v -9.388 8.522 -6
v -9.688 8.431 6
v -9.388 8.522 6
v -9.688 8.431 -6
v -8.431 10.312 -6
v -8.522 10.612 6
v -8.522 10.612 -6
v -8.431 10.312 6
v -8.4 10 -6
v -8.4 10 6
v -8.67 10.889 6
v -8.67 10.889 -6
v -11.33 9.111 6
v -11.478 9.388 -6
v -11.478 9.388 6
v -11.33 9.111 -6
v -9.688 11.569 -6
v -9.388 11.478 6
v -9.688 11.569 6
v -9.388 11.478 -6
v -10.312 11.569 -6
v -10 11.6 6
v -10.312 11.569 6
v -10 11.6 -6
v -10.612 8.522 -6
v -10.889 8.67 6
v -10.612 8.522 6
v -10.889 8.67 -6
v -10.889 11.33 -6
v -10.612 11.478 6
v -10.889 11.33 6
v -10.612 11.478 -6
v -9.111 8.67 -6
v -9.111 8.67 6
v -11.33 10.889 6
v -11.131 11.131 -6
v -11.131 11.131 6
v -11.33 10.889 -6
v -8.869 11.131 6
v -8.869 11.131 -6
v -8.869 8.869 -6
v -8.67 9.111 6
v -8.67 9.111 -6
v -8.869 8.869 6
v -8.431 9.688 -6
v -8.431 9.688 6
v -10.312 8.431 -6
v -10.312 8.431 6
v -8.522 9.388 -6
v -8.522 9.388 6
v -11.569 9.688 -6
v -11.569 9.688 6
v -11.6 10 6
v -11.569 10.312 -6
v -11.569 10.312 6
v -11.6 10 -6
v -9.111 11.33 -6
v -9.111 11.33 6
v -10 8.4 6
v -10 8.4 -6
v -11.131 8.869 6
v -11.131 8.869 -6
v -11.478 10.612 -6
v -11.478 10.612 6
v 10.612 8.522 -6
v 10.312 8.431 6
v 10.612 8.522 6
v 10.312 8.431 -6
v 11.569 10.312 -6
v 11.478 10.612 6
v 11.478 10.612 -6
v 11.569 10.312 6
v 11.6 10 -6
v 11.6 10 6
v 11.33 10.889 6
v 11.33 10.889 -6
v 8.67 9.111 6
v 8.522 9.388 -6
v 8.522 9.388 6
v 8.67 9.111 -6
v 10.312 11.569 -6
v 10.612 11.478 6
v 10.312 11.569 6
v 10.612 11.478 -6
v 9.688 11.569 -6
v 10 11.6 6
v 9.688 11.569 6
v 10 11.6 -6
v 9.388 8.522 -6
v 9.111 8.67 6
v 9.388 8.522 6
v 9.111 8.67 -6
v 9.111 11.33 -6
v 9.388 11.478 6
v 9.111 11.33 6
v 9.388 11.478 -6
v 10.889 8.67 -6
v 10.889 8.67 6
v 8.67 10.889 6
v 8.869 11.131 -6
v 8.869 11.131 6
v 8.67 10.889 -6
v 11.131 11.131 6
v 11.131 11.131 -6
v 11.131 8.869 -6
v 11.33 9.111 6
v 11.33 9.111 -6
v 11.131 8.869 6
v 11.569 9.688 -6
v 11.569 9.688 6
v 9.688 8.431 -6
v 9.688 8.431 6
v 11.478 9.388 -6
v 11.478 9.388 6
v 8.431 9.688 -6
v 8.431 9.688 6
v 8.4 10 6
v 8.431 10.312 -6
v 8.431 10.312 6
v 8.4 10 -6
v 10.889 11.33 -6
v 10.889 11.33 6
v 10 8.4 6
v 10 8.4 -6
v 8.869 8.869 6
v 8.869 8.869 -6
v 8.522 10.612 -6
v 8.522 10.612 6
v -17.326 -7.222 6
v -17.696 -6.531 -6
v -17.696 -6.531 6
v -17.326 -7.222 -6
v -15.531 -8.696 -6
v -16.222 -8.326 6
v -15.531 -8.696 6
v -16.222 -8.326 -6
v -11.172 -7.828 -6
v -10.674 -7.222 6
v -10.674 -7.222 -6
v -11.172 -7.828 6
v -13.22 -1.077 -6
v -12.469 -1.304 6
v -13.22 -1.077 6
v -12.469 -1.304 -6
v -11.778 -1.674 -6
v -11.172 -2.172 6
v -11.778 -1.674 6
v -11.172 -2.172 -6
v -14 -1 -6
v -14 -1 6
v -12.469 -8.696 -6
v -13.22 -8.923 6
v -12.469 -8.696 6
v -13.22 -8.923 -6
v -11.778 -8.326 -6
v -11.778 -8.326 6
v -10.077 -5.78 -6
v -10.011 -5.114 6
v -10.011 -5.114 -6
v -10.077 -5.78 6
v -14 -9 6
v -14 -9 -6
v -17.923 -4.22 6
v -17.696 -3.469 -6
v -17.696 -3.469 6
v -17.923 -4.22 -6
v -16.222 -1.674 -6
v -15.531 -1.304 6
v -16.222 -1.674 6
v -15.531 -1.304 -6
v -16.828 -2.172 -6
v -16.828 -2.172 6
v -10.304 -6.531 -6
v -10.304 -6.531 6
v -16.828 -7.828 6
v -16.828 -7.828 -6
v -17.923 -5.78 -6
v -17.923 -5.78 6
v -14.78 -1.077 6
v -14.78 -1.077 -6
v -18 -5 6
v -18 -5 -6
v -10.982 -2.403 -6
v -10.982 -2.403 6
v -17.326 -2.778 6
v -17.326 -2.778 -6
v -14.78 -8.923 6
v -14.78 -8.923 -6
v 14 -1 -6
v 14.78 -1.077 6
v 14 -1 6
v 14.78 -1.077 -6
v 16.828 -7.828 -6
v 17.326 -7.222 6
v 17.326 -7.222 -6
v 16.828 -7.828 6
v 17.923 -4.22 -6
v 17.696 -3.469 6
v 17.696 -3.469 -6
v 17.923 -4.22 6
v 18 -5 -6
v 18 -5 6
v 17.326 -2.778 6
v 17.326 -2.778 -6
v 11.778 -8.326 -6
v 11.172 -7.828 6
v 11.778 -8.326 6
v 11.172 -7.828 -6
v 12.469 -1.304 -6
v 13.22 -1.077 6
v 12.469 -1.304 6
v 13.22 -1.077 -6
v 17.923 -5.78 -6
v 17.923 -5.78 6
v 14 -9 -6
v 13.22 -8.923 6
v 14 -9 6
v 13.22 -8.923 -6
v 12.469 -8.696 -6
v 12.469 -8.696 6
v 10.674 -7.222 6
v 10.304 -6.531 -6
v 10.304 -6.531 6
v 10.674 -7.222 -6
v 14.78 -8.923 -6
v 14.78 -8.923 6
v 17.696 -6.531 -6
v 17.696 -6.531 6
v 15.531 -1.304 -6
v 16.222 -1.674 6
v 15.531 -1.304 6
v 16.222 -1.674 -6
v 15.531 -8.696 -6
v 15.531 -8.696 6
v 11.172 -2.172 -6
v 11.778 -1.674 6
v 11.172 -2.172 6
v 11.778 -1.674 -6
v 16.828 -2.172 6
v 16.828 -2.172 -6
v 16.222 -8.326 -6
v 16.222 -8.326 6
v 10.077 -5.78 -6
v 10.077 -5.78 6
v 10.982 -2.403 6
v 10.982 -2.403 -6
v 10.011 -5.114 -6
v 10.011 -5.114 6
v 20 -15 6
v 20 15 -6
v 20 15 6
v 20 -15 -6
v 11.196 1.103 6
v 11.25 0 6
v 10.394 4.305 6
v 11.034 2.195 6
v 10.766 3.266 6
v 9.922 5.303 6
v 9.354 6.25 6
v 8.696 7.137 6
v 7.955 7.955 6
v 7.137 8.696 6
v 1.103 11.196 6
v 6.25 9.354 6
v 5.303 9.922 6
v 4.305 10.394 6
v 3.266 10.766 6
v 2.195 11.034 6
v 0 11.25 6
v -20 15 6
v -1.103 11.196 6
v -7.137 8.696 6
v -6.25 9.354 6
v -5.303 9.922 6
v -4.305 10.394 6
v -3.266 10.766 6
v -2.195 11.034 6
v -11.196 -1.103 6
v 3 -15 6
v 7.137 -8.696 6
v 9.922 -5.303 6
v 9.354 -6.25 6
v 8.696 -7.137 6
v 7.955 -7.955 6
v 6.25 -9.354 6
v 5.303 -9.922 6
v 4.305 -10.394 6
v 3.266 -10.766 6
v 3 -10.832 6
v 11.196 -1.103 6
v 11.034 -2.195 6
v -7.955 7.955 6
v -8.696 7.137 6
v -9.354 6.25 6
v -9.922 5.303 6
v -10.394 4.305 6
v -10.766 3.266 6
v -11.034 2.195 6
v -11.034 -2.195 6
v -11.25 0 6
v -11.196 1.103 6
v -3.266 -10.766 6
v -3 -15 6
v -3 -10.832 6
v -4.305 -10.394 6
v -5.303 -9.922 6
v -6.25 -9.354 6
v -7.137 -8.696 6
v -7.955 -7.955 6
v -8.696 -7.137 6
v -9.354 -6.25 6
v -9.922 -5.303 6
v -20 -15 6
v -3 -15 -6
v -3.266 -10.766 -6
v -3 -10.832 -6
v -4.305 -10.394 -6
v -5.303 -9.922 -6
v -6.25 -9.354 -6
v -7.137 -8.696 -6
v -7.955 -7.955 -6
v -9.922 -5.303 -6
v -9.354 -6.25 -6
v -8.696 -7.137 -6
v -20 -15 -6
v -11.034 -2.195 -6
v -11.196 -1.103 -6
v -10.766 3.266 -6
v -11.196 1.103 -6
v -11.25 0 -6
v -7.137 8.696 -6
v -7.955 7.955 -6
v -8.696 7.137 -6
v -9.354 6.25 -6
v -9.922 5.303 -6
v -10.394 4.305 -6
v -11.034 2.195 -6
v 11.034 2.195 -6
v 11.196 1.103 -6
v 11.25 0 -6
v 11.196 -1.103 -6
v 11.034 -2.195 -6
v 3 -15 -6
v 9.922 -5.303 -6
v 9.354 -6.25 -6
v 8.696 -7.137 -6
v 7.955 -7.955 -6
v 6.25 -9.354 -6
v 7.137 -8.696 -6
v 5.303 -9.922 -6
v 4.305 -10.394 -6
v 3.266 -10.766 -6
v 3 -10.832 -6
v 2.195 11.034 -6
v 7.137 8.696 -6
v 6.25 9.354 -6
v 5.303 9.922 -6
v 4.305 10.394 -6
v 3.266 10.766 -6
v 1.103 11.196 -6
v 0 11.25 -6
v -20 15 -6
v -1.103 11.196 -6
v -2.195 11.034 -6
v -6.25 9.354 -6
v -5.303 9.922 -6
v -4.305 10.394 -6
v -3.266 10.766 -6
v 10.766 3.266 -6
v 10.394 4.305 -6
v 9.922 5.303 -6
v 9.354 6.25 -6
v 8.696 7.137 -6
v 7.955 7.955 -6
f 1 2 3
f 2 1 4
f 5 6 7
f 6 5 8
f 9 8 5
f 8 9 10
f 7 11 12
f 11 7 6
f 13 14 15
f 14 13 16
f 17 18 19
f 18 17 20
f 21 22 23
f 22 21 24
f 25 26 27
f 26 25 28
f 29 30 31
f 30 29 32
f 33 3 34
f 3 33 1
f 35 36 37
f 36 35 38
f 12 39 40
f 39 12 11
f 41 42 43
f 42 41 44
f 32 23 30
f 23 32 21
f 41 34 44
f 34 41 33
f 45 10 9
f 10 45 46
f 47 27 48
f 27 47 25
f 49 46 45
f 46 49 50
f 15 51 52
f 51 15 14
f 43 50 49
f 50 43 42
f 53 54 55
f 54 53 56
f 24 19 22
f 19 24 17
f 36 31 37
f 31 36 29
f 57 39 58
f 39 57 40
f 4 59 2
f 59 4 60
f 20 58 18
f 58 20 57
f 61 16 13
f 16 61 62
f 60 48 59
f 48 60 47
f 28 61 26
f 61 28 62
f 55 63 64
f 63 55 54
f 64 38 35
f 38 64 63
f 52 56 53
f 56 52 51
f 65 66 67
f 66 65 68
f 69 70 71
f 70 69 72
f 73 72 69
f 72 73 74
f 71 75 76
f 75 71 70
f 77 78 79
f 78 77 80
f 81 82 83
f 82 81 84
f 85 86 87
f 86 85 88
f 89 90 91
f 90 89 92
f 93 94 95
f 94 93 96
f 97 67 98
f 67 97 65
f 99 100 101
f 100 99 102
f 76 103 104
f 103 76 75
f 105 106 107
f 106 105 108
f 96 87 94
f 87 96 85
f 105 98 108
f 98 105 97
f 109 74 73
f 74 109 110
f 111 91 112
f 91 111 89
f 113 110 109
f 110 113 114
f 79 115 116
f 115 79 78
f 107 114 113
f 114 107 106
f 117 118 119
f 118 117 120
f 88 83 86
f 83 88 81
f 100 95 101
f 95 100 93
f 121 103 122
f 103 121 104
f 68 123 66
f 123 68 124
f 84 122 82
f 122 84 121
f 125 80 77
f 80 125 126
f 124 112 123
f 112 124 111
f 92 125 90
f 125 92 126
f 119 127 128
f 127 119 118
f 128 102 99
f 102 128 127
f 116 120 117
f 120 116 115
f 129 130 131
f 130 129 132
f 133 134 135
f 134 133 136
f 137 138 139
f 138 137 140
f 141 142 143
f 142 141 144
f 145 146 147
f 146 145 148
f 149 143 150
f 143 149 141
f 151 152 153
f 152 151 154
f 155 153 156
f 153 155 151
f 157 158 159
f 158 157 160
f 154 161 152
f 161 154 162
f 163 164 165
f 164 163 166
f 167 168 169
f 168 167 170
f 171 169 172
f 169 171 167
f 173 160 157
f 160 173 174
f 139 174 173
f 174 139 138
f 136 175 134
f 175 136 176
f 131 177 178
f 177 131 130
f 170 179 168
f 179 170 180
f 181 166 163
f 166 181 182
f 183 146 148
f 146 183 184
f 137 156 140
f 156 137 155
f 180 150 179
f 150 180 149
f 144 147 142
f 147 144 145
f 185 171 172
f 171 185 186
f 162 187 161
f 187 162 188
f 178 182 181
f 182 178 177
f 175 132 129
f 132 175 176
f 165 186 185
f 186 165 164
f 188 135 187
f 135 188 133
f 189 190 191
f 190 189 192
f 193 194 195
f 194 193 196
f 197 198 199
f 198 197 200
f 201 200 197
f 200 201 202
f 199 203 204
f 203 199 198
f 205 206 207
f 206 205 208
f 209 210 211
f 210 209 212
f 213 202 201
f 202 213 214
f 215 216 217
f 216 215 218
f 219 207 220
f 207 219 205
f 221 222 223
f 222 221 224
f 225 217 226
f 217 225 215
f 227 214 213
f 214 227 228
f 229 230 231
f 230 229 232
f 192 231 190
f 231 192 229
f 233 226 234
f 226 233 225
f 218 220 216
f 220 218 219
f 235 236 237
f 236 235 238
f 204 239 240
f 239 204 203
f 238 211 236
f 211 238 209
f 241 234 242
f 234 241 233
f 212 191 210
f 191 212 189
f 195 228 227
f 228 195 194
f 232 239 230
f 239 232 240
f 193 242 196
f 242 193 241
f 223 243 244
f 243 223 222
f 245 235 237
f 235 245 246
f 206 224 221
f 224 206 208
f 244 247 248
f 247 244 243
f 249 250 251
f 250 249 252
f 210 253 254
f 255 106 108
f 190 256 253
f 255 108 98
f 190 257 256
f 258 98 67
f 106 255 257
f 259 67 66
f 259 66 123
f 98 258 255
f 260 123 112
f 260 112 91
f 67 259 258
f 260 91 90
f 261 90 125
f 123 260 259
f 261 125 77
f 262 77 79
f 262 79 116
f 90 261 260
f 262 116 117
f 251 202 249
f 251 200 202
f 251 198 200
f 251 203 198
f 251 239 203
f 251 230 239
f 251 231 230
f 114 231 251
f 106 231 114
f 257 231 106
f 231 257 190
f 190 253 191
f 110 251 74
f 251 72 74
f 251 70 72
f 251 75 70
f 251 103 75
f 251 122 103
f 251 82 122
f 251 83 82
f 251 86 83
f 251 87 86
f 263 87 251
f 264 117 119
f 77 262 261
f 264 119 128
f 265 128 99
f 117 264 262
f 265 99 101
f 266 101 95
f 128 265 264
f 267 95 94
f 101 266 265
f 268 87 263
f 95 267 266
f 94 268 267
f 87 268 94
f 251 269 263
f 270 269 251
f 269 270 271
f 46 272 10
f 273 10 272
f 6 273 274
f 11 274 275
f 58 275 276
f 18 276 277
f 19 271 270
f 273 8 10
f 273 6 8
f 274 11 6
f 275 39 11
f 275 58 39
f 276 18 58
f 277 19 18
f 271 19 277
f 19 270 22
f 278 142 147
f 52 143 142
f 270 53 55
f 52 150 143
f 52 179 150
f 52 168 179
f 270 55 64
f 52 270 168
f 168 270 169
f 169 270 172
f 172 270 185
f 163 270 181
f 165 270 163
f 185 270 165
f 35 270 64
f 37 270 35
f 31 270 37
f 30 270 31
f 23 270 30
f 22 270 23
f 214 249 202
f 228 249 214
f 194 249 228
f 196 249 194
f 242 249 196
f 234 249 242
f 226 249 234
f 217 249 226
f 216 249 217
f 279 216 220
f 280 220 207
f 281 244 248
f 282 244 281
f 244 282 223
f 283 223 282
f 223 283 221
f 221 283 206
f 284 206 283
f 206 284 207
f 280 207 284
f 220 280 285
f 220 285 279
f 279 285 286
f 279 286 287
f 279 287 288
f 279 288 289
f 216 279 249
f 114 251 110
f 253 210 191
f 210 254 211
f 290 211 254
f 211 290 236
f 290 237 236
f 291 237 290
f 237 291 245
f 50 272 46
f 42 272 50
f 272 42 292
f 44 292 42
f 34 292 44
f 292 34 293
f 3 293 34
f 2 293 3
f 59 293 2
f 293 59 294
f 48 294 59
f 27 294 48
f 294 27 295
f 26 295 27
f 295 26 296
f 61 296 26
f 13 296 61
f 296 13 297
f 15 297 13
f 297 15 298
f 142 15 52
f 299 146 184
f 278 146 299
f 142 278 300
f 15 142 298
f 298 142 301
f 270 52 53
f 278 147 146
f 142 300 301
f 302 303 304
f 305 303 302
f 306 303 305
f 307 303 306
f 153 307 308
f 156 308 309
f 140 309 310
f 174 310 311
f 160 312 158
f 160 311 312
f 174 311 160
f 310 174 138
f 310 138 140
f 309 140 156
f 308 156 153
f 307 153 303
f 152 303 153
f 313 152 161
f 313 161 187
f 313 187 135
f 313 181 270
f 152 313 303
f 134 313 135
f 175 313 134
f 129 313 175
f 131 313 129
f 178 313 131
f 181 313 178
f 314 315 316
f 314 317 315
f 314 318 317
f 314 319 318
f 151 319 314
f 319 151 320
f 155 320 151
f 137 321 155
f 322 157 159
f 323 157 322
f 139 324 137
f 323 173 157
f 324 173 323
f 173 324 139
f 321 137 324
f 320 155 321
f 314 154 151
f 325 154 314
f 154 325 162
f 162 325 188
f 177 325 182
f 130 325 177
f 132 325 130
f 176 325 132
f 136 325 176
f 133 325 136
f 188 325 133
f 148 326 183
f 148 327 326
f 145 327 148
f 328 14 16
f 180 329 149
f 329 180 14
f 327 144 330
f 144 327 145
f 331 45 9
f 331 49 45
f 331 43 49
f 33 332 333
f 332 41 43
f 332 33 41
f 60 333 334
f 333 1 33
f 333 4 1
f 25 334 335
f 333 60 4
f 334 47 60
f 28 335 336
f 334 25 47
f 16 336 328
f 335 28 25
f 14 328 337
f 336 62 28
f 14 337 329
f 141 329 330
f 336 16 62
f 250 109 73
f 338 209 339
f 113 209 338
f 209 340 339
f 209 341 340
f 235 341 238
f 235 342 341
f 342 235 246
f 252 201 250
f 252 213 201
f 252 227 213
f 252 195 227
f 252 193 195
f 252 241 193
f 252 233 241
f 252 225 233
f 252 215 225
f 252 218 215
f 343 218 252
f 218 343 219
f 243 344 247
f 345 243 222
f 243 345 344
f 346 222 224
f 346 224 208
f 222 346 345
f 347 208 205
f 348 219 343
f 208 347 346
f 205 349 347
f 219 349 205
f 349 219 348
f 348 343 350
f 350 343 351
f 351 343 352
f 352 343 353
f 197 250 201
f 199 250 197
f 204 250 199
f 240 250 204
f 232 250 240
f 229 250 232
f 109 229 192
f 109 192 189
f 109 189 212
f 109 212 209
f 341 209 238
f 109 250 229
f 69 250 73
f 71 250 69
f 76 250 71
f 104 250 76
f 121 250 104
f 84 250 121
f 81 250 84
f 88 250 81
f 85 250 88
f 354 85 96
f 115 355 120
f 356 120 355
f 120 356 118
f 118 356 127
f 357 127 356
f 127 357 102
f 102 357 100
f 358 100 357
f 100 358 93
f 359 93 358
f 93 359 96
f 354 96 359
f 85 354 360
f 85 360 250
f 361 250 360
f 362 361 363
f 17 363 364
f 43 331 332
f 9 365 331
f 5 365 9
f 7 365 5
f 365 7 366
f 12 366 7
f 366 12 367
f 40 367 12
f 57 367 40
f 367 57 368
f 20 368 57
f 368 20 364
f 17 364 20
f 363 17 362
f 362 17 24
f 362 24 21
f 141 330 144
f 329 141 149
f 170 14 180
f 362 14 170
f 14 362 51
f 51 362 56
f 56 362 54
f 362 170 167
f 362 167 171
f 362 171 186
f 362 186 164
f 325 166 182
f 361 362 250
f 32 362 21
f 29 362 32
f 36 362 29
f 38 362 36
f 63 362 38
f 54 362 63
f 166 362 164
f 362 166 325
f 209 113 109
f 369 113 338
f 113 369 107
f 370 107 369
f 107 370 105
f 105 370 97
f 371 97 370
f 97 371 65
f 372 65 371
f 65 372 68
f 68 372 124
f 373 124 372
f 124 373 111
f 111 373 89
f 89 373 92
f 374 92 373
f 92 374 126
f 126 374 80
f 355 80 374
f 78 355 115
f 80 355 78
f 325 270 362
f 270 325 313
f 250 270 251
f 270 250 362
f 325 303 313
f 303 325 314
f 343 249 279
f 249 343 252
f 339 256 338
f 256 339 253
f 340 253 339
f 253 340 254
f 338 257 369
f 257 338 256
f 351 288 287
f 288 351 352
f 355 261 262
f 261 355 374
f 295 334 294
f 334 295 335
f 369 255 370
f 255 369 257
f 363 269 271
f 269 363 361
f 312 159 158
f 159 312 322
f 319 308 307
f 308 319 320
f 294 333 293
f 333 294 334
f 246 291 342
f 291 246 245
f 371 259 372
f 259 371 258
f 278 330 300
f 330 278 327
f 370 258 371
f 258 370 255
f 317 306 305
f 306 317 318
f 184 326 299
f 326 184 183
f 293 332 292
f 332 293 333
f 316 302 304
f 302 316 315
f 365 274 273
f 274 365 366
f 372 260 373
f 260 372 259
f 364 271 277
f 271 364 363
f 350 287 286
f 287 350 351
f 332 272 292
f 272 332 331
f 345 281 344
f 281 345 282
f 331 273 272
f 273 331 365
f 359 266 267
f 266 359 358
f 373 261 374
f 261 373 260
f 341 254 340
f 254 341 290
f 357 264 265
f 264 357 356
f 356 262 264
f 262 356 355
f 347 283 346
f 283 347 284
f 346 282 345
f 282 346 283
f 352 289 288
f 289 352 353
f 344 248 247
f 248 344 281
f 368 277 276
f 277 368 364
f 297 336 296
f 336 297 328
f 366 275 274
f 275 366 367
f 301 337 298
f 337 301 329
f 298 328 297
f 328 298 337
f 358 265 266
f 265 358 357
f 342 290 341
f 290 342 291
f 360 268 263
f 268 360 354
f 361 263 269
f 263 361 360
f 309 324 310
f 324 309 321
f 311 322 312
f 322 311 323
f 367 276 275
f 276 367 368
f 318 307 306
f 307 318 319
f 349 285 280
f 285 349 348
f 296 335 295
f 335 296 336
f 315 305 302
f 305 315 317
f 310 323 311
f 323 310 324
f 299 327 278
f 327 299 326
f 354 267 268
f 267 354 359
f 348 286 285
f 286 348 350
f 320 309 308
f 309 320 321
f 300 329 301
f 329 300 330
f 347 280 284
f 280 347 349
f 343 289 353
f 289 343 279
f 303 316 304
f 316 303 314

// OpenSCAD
// T8 Leadscrew Anti-Backlash Nut Block
// T8: 8mm leadscrew, 22mm flange, MGN12 rail mount
leadscrew_d = 8;
nut_flange_d = 22;
nut_h = 15;
block_width = 40;
block_height = 12;
rail_hole_spacing = 20;  // MGN12

difference() {
    // Main block
    cube([block_width, 30, block_height], center=true);

    // Leadscrew nut pocket
    cylinder(d=nut_flange_d + 0.5, h=block_height + 1, center=true, $fn=64);

    // Leadscrew clearance
    cylinder(d=leadscrew_d + 2, h=block_height + 10, center=true, $fn=64);

    // Nut mounting holes (usually 4 on flange)
    for (i = [0:3]) {
        rotate([0, 0, i * 90 + 45])
            translate([nut_flange_d/2 - 2, 0, 0])
                cylinder(d=3.2, h=block_height + 1, center=true, $fn=32);
    }

    // MGN12 rail mounting holes
    for (x = [-1, 1]) {
        translate([x * rail_hole_spacing/2, 10, 0])
            cylinder(d=3.2, h=block_height + 1, center=true, $fn=32);
    }

    // Anti-rotation slot
    translate([0, -12, 0])
        cube([6, 8, block_height + 1], center=true);

    // Weight reduction
    for (x = [-1, 1]) {
        translate([x * 14, -5, 0])
            cylinder(d=8, h=block_height + 1, center=true, $fn=32);
    }
}
